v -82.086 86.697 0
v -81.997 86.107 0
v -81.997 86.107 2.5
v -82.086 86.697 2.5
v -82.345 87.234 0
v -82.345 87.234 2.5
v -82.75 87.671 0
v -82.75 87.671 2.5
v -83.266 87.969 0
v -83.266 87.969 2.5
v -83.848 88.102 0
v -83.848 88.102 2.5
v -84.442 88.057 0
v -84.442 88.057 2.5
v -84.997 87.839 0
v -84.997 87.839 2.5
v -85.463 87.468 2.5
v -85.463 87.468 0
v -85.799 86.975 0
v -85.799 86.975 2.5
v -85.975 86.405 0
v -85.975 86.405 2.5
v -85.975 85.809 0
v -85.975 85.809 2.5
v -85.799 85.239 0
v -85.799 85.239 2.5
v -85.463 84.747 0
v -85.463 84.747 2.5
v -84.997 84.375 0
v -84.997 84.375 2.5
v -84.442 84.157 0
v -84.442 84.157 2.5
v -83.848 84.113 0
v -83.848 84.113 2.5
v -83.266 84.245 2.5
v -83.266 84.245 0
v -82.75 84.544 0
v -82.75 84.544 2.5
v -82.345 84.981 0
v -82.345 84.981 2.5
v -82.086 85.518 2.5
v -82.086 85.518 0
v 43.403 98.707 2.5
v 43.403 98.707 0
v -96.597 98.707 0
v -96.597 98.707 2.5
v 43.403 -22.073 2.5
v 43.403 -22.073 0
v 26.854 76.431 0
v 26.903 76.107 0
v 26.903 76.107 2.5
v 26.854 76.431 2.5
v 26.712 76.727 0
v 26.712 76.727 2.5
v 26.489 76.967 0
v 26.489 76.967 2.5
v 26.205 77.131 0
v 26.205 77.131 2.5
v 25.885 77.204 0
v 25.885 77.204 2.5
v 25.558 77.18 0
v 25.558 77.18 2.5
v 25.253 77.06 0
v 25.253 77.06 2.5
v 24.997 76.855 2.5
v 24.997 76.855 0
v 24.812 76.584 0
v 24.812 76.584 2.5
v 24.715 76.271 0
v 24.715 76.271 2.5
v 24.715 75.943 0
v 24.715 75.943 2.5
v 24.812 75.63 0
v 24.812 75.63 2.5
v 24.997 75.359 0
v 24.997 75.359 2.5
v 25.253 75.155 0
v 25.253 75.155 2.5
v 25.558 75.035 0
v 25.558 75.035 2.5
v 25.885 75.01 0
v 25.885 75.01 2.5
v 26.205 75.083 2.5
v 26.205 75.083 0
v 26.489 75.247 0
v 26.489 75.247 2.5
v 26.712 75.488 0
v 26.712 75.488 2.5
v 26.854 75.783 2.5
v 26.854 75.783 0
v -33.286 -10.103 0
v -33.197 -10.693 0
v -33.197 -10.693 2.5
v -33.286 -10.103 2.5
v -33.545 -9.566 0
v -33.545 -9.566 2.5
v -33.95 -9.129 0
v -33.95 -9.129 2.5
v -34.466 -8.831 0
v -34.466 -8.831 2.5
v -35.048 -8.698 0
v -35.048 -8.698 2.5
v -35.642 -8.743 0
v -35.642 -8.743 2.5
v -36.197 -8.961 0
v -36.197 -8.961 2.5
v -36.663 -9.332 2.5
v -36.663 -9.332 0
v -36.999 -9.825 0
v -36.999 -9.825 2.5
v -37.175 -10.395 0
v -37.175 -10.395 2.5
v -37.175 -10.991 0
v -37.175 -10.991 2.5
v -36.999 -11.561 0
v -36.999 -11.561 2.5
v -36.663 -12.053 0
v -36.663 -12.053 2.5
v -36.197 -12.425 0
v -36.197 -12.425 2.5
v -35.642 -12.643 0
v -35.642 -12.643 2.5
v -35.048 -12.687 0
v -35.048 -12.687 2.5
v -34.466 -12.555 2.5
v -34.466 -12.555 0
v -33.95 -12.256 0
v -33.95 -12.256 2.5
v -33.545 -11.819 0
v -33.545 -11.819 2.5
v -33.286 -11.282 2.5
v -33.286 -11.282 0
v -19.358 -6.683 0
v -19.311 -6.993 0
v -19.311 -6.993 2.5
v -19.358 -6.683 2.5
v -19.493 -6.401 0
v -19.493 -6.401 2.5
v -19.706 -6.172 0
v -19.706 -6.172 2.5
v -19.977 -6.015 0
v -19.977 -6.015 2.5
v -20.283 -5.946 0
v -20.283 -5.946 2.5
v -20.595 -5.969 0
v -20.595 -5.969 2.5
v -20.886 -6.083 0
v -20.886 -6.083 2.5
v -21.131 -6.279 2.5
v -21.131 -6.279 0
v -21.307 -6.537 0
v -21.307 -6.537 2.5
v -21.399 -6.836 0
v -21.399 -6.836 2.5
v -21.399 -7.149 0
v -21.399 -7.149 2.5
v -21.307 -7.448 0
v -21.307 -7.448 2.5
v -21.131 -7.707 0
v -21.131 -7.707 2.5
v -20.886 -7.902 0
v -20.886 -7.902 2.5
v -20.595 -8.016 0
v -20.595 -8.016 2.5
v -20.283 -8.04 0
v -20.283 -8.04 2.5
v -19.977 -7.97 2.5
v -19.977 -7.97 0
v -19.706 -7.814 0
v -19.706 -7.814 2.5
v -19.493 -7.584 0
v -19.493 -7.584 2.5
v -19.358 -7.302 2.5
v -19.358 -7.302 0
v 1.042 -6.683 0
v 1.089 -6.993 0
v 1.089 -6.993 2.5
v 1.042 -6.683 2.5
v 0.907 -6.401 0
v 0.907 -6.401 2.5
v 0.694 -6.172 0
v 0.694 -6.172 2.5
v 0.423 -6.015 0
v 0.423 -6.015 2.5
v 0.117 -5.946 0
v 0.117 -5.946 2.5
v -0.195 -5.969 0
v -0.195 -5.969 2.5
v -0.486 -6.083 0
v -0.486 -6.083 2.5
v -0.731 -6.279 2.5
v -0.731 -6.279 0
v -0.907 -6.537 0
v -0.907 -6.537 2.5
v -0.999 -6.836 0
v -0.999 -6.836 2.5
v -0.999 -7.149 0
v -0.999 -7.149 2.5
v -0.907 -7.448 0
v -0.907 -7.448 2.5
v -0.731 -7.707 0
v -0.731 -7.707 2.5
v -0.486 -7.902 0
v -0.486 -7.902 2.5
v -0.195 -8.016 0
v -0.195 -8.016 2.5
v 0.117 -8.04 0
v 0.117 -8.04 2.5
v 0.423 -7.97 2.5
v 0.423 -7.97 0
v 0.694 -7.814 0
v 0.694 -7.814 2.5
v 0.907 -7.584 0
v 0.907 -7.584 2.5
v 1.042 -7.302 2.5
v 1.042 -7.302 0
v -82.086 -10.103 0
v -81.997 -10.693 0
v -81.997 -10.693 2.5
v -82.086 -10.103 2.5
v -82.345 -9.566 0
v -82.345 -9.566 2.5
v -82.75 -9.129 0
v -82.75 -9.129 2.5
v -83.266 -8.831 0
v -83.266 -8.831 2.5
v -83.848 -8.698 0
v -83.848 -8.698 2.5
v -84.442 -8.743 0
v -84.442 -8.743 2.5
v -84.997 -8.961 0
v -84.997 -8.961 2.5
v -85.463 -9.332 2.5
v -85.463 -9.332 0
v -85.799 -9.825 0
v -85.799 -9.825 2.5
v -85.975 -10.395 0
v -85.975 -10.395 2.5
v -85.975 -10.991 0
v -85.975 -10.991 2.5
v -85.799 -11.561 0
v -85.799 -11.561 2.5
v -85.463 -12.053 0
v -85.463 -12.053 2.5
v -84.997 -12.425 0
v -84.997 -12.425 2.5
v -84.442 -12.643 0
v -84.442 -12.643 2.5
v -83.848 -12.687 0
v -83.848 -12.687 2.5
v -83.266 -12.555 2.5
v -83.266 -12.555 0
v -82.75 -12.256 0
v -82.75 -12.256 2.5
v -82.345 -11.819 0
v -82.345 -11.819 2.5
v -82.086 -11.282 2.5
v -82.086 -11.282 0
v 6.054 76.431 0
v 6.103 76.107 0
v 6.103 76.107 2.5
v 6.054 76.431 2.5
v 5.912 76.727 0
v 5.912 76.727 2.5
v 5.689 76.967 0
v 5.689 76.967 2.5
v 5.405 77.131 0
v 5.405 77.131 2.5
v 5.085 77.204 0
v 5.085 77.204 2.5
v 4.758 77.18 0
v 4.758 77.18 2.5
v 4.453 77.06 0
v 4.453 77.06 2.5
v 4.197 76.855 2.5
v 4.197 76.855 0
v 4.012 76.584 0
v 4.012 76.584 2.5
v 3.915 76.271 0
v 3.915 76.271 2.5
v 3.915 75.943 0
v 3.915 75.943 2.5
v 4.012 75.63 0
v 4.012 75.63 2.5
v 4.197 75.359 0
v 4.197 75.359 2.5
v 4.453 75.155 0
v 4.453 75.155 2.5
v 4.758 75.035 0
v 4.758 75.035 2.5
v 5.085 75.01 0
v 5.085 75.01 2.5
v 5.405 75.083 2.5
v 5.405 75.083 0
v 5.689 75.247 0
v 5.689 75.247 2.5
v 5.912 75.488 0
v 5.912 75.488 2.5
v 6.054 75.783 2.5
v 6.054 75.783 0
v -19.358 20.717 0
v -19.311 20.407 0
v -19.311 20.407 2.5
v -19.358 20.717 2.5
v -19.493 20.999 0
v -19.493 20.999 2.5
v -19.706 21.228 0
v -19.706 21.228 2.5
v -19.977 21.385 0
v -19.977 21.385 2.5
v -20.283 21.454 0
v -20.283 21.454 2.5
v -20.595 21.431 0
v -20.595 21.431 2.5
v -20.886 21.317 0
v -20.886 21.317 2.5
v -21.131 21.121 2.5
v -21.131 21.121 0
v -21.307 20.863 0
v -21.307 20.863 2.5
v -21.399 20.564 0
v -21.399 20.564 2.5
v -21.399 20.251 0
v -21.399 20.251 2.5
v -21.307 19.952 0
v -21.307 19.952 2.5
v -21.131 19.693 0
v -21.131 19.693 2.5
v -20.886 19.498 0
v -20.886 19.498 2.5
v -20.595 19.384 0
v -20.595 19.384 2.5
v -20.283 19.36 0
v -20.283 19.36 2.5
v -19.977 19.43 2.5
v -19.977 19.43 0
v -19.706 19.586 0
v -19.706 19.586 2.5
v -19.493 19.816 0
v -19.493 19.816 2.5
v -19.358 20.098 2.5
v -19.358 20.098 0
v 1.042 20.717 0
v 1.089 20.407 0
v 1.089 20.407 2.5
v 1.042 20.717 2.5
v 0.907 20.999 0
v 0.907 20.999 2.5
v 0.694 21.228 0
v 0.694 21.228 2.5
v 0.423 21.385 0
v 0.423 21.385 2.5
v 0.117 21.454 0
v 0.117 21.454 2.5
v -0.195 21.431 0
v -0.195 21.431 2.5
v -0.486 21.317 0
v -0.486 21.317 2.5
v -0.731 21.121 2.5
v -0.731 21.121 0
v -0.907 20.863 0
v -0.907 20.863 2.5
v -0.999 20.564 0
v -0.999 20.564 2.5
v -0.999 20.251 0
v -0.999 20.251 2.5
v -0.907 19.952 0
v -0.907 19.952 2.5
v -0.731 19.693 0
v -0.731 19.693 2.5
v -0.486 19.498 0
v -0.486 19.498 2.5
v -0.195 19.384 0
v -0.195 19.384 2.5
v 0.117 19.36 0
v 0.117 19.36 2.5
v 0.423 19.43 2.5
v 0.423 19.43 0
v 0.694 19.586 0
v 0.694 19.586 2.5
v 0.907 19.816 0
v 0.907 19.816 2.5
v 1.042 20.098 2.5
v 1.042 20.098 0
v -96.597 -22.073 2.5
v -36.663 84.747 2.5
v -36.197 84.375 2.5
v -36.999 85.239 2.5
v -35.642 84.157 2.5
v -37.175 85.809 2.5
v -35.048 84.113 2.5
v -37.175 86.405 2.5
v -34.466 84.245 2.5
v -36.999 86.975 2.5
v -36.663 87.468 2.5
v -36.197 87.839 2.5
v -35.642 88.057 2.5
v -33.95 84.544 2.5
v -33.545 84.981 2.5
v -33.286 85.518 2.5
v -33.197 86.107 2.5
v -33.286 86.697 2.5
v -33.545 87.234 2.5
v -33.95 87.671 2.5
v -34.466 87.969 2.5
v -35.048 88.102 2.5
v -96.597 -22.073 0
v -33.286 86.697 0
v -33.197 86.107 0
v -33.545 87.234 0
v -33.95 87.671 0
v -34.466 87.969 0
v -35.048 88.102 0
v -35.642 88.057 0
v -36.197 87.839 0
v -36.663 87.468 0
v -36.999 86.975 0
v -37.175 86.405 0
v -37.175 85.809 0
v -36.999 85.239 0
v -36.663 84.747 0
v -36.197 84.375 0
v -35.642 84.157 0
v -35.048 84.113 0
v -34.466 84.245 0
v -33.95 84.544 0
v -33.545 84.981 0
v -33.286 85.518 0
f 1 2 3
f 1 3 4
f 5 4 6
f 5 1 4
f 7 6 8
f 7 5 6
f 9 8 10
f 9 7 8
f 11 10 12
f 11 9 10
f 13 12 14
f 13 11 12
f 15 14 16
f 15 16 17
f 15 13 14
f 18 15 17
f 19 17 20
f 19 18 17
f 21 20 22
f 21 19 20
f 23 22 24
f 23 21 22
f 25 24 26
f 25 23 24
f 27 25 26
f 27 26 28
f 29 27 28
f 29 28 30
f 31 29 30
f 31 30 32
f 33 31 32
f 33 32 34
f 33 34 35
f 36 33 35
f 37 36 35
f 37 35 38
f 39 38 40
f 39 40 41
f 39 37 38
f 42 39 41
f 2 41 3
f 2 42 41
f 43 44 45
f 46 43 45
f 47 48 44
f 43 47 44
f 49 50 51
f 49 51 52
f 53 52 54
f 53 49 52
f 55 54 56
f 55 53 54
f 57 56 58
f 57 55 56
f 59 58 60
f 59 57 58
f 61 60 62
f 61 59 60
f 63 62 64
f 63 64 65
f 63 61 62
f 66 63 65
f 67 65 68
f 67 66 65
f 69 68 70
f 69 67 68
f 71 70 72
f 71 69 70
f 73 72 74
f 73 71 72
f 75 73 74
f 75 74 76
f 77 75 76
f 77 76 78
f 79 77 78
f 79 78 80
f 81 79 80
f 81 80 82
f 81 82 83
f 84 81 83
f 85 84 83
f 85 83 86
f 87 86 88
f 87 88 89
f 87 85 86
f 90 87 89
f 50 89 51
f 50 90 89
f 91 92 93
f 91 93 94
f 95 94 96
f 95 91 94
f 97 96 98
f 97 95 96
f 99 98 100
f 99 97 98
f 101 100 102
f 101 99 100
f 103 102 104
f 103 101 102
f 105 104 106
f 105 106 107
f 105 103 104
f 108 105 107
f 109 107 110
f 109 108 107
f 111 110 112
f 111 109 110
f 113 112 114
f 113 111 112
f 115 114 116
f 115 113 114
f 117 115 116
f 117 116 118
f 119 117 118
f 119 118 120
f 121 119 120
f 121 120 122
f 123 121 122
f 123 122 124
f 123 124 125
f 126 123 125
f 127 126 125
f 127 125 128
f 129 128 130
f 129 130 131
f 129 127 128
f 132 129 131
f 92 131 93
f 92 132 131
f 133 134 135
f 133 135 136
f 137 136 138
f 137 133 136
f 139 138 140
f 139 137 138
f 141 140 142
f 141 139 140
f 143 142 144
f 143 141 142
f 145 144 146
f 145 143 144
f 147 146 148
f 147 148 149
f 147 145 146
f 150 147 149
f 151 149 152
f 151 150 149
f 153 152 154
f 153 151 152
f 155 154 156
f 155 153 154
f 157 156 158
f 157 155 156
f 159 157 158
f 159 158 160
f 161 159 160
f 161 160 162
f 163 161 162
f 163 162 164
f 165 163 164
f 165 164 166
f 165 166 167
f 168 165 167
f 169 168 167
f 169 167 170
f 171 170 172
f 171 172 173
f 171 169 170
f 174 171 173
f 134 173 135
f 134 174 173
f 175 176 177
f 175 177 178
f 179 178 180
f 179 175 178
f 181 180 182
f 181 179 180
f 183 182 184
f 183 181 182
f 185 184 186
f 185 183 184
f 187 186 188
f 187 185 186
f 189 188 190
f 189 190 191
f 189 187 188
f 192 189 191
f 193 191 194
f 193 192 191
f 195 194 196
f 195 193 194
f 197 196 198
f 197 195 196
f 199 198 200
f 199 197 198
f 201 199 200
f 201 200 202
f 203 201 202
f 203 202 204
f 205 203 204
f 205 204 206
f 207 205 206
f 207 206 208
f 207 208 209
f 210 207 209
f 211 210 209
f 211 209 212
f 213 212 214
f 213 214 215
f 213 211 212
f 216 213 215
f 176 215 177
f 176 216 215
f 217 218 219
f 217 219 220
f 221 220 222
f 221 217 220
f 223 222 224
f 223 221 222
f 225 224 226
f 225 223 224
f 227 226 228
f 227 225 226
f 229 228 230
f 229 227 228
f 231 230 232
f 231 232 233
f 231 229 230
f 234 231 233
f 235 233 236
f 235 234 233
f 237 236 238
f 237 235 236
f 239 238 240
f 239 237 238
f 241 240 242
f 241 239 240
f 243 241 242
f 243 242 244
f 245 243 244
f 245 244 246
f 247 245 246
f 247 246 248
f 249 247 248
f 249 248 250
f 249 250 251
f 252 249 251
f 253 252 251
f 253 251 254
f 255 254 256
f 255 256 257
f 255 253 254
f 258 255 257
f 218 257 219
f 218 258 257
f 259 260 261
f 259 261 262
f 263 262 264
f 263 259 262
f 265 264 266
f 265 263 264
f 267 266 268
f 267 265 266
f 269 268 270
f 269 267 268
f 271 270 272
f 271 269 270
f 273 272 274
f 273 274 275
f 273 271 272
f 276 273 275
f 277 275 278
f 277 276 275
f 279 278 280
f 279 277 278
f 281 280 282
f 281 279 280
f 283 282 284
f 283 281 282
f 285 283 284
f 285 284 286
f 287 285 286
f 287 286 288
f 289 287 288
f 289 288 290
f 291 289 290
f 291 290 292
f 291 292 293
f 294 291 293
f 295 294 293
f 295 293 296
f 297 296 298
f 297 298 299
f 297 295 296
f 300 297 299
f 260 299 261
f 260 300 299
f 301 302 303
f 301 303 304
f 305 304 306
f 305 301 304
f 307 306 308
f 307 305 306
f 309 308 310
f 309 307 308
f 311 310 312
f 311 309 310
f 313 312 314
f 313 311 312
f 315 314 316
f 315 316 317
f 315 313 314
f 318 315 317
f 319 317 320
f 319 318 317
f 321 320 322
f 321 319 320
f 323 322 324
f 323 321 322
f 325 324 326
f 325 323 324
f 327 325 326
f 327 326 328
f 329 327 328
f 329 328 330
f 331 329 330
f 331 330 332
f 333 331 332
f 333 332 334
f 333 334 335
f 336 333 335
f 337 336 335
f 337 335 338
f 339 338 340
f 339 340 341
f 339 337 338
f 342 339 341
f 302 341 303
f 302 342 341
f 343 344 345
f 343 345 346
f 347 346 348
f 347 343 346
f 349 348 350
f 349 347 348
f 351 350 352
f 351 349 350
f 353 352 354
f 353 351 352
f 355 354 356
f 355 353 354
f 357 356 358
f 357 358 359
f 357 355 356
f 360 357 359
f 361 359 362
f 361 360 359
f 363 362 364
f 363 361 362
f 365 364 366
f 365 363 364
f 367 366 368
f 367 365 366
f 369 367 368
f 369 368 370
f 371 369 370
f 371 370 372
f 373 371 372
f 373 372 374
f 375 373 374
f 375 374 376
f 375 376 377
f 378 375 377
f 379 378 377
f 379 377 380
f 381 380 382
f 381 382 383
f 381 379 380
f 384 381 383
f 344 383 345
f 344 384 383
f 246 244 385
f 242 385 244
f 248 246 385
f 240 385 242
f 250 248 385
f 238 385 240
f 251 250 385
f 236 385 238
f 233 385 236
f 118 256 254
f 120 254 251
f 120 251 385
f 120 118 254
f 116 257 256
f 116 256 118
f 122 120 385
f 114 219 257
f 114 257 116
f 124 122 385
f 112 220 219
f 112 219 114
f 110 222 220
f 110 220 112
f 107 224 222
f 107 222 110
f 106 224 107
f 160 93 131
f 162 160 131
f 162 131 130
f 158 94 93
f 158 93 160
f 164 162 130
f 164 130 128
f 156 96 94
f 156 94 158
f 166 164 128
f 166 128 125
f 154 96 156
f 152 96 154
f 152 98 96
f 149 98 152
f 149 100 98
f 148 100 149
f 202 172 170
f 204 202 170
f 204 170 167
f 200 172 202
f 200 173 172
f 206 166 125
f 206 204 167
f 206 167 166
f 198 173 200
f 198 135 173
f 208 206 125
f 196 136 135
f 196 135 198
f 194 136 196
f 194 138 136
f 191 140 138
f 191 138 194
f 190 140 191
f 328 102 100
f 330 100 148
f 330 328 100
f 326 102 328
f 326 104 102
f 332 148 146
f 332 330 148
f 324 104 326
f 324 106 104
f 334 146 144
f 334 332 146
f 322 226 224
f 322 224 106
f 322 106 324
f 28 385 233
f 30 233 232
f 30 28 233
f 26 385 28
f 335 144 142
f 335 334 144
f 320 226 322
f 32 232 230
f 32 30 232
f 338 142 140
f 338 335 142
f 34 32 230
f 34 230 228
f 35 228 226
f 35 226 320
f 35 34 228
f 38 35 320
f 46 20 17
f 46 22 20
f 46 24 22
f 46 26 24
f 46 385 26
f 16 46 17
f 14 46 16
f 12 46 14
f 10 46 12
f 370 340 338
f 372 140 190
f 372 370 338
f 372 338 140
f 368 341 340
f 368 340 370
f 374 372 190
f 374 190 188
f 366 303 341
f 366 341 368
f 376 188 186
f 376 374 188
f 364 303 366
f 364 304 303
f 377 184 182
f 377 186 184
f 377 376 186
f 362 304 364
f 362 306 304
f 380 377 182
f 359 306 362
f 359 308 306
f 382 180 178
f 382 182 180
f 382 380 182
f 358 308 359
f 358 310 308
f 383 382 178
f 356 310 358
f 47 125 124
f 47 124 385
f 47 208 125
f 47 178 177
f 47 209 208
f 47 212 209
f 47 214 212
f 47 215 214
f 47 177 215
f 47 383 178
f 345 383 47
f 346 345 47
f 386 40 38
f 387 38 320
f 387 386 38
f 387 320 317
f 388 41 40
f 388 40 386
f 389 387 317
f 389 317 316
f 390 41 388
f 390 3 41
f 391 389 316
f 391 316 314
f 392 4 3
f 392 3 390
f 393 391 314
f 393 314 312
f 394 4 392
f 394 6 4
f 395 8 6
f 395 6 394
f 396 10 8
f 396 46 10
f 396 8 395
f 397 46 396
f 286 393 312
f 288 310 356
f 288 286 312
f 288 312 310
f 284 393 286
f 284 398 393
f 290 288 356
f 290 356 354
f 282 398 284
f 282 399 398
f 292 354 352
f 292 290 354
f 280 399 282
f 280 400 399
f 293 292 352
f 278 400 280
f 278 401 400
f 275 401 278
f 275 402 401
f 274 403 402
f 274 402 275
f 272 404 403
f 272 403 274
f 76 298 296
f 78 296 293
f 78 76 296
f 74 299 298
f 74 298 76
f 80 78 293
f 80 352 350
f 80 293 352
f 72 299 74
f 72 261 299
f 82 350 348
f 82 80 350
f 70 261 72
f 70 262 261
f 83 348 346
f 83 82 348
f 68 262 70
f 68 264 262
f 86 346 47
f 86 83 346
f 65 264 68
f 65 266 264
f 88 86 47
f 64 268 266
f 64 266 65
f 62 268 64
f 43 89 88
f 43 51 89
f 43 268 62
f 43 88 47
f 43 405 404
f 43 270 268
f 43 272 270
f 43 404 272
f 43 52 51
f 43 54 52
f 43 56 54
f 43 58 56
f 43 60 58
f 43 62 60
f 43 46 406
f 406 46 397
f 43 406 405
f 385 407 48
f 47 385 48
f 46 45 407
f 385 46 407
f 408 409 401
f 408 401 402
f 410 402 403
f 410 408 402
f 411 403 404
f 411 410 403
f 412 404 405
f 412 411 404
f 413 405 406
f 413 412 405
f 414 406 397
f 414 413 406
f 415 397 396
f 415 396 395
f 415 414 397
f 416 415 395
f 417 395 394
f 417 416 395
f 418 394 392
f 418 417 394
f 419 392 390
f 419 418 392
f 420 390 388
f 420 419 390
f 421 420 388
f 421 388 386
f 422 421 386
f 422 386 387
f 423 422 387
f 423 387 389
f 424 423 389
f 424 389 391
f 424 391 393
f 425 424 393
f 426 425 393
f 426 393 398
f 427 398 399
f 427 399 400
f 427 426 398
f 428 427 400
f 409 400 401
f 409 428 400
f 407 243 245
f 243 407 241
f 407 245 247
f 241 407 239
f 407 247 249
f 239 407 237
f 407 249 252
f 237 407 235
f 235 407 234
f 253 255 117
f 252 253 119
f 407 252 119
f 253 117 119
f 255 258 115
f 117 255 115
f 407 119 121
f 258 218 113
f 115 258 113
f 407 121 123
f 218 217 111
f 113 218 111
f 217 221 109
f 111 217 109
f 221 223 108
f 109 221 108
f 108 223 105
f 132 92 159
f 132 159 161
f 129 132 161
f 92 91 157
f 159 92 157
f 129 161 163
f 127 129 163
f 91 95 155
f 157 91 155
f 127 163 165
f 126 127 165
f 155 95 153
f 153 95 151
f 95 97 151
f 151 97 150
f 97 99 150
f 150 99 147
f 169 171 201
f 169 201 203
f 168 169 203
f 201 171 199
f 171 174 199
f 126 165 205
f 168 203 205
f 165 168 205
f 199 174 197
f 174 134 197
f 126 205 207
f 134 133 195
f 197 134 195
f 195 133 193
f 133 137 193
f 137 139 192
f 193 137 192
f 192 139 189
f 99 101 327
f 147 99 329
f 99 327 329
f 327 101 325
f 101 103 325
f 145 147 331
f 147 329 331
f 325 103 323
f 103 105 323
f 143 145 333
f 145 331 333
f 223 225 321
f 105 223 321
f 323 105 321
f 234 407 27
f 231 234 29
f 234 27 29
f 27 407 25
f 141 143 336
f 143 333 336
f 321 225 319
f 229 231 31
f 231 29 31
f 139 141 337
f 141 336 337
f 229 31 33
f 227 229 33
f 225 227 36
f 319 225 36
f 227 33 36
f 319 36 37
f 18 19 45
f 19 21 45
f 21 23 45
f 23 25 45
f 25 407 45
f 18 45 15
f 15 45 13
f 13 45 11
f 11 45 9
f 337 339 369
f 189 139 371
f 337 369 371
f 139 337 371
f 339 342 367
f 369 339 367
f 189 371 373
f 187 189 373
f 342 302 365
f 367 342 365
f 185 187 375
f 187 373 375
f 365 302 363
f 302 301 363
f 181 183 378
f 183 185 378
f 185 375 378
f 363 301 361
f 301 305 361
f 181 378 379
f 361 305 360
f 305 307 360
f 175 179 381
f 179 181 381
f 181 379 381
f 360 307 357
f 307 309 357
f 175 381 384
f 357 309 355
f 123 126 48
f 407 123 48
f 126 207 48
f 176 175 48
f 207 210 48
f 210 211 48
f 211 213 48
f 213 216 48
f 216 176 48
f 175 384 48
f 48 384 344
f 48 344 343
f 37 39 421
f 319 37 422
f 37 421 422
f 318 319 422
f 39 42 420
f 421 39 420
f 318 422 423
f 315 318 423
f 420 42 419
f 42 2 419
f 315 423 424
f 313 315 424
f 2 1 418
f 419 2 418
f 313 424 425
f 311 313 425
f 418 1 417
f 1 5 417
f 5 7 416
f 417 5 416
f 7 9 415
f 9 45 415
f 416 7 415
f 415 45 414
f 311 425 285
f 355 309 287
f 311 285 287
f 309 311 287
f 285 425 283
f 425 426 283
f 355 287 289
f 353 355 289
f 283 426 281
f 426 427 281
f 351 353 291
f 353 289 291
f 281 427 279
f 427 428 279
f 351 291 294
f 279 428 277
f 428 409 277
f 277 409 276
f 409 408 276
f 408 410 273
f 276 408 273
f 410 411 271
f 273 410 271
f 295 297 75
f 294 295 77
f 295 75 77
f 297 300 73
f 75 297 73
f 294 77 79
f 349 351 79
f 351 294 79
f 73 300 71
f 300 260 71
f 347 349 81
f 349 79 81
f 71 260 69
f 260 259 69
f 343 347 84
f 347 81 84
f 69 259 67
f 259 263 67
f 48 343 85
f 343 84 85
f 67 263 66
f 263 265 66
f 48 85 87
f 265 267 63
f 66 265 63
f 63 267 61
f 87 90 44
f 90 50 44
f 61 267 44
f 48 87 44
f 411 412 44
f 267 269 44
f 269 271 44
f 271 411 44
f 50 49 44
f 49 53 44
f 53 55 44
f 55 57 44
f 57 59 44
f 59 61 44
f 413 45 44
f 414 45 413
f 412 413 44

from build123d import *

# Parameters (mm, degrees)
F0_W     = 26
F0_H     = 35.5
F0_W_2   = 45
F0_H_2   = 10
F0_R     = 2
F0_R_2   = 1.05
F0_W_3   = 15
F0_R_3   = 1.1
F1_DEPTH = 2.5


with BuildPart() as f1:
    # F0 (on Top) → F1 (new body)
    with BuildSketch(Plane.XY):
        Polygon((-81.5970200658, 98.7071764616), (-96.5970200658, 98.7071764616), (-96.5970200658, -22.0728235384), (43.4029799342, -22.0728235384), (43.4029799342, 98.7071764616), (-36.5970200658, 98.7071764616), (-36.5970200658, 88.7071764616), (-35.1970200658, 88.7071764616), (-32.5970200658, 88.7071764616), (-32.5970200658, 86.1071764616), (-32.5970200658, -10.6928235384), (-32.5970200658, -13.2928235384), (-35.1970200658, -13.2928235384), (-83.9970200658, -13.2928235384), (-86.5970200658, -13.2928235384), (-86.5970200658, -10.6928235384), (-86.5970200658, 86.1071764616), (-86.5970200658, 86.5071764616), (-86.5970200658, 88.7071764616), (-84.3970200658, 88.7071764616), (-83.9970200658, 88.7071764616), (-81.5970200658, 88.7071764616), align=None)
        Polygon((-23.1610157355, -9.7928235384), (-23.1610157355, 23.2071764616), (-17.1610157355, 23.2071764616), (-17.1610157355, 33.2071764616), (-2.1610157355, 33.2071764616), (-2.1610157355, 23.2071764616), (2.8389842645, 23.2071764616), (2.8389842645, -9.7928235384), align=None, mode=Mode.SUBTRACT)
        with Locations((15.4029799342, 60.9571764616)):
            Rectangle(F0_W, F0_H, mode=Mode.SUBTRACT)
        with Locations((-59.0970200658, 93.7071764616)):
            Rectangle(F0_W_2, F0_H_2)
        Polygon((-36.5970200658, 88.7071764616), (-81.5970200658, 88.7071764616), (-83.9970200658, 88.7071764616), (-84.3970200658, 88.7071764616), (-86.5970200658, 88.7071764616), (-86.5970200658, 86.5071764616), (-86.5970200658, 86.1071764616), (-86.5970200658, -10.6928235384), (-86.5970200658, -13.2928235384), (-83.9970200658, -13.2928235384), (-35.1970200658, -13.2928235384), (-32.5970200658, -13.2928235384), (-32.5970200658, -10.6928235384), (-32.5970200658, 86.1071764616), (-32.5970200658, 88.7071764616), (-35.1970200658, 88.7071764616), align=None)
        with Locations((-83.9970200658, -10.6928235384)):
            Circle(F0_R, mode=Mode.SUBTRACT)
        with Locations((-35.1970200658, -10.6928235384)):
            Circle(F0_R, mode=Mode.SUBTRACT)
        with Locations((-83.9970200658, 86.1071764616)):
            Circle(F0_R, mode=Mode.SUBTRACT)
        with Locations((-35.1970200658, 86.1071764616)):
            Circle(F0_R, mode=Mode.SUBTRACT)
        Polygon((-17.1610157355, 23.2071764616), (-23.1610157355, 23.2071764616), (-23.1610157355, -9.7928235384), (2.8389842645, -9.7928235384), (2.8389842645, 23.2071764616), (-2.1610157355, 23.2071764616), align=None)
        with Locations((-20.3610157355, -6.9928235384)):
            Circle(F0_R_2, mode=Mode.SUBTRACT)
        with Locations((0.0389842645, -6.9928235384)):
            Circle(F0_R_2, mode=Mode.SUBTRACT)
        with Locations((-20.3610157355, 20.4071764616)):
            Circle(F0_R_2, mode=Mode.SUBTRACT)
        with Locations((0.0389842645, 20.4071764616)):
            Circle(F0_R_2, mode=Mode.SUBTRACT)
        with Locations((-9.6610157355, 28.2071764616)):
            Rectangle(F0_W_3, F0_H_2)
        with Locations((15.4029799342, 60.9571764616)):
            Rectangle(F0_W, F0_H)
        with Locations((5.0029799342, 76.1071764616)):
            Circle(F0_R_3, mode=Mode.SUBTRACT)
        with Locations((25.8029799342, 76.1071764616)):
            Circle(F0_R_3, mode=Mode.SUBTRACT)
    extrude(amount=F1_DEPTH)


solid = f1.part
